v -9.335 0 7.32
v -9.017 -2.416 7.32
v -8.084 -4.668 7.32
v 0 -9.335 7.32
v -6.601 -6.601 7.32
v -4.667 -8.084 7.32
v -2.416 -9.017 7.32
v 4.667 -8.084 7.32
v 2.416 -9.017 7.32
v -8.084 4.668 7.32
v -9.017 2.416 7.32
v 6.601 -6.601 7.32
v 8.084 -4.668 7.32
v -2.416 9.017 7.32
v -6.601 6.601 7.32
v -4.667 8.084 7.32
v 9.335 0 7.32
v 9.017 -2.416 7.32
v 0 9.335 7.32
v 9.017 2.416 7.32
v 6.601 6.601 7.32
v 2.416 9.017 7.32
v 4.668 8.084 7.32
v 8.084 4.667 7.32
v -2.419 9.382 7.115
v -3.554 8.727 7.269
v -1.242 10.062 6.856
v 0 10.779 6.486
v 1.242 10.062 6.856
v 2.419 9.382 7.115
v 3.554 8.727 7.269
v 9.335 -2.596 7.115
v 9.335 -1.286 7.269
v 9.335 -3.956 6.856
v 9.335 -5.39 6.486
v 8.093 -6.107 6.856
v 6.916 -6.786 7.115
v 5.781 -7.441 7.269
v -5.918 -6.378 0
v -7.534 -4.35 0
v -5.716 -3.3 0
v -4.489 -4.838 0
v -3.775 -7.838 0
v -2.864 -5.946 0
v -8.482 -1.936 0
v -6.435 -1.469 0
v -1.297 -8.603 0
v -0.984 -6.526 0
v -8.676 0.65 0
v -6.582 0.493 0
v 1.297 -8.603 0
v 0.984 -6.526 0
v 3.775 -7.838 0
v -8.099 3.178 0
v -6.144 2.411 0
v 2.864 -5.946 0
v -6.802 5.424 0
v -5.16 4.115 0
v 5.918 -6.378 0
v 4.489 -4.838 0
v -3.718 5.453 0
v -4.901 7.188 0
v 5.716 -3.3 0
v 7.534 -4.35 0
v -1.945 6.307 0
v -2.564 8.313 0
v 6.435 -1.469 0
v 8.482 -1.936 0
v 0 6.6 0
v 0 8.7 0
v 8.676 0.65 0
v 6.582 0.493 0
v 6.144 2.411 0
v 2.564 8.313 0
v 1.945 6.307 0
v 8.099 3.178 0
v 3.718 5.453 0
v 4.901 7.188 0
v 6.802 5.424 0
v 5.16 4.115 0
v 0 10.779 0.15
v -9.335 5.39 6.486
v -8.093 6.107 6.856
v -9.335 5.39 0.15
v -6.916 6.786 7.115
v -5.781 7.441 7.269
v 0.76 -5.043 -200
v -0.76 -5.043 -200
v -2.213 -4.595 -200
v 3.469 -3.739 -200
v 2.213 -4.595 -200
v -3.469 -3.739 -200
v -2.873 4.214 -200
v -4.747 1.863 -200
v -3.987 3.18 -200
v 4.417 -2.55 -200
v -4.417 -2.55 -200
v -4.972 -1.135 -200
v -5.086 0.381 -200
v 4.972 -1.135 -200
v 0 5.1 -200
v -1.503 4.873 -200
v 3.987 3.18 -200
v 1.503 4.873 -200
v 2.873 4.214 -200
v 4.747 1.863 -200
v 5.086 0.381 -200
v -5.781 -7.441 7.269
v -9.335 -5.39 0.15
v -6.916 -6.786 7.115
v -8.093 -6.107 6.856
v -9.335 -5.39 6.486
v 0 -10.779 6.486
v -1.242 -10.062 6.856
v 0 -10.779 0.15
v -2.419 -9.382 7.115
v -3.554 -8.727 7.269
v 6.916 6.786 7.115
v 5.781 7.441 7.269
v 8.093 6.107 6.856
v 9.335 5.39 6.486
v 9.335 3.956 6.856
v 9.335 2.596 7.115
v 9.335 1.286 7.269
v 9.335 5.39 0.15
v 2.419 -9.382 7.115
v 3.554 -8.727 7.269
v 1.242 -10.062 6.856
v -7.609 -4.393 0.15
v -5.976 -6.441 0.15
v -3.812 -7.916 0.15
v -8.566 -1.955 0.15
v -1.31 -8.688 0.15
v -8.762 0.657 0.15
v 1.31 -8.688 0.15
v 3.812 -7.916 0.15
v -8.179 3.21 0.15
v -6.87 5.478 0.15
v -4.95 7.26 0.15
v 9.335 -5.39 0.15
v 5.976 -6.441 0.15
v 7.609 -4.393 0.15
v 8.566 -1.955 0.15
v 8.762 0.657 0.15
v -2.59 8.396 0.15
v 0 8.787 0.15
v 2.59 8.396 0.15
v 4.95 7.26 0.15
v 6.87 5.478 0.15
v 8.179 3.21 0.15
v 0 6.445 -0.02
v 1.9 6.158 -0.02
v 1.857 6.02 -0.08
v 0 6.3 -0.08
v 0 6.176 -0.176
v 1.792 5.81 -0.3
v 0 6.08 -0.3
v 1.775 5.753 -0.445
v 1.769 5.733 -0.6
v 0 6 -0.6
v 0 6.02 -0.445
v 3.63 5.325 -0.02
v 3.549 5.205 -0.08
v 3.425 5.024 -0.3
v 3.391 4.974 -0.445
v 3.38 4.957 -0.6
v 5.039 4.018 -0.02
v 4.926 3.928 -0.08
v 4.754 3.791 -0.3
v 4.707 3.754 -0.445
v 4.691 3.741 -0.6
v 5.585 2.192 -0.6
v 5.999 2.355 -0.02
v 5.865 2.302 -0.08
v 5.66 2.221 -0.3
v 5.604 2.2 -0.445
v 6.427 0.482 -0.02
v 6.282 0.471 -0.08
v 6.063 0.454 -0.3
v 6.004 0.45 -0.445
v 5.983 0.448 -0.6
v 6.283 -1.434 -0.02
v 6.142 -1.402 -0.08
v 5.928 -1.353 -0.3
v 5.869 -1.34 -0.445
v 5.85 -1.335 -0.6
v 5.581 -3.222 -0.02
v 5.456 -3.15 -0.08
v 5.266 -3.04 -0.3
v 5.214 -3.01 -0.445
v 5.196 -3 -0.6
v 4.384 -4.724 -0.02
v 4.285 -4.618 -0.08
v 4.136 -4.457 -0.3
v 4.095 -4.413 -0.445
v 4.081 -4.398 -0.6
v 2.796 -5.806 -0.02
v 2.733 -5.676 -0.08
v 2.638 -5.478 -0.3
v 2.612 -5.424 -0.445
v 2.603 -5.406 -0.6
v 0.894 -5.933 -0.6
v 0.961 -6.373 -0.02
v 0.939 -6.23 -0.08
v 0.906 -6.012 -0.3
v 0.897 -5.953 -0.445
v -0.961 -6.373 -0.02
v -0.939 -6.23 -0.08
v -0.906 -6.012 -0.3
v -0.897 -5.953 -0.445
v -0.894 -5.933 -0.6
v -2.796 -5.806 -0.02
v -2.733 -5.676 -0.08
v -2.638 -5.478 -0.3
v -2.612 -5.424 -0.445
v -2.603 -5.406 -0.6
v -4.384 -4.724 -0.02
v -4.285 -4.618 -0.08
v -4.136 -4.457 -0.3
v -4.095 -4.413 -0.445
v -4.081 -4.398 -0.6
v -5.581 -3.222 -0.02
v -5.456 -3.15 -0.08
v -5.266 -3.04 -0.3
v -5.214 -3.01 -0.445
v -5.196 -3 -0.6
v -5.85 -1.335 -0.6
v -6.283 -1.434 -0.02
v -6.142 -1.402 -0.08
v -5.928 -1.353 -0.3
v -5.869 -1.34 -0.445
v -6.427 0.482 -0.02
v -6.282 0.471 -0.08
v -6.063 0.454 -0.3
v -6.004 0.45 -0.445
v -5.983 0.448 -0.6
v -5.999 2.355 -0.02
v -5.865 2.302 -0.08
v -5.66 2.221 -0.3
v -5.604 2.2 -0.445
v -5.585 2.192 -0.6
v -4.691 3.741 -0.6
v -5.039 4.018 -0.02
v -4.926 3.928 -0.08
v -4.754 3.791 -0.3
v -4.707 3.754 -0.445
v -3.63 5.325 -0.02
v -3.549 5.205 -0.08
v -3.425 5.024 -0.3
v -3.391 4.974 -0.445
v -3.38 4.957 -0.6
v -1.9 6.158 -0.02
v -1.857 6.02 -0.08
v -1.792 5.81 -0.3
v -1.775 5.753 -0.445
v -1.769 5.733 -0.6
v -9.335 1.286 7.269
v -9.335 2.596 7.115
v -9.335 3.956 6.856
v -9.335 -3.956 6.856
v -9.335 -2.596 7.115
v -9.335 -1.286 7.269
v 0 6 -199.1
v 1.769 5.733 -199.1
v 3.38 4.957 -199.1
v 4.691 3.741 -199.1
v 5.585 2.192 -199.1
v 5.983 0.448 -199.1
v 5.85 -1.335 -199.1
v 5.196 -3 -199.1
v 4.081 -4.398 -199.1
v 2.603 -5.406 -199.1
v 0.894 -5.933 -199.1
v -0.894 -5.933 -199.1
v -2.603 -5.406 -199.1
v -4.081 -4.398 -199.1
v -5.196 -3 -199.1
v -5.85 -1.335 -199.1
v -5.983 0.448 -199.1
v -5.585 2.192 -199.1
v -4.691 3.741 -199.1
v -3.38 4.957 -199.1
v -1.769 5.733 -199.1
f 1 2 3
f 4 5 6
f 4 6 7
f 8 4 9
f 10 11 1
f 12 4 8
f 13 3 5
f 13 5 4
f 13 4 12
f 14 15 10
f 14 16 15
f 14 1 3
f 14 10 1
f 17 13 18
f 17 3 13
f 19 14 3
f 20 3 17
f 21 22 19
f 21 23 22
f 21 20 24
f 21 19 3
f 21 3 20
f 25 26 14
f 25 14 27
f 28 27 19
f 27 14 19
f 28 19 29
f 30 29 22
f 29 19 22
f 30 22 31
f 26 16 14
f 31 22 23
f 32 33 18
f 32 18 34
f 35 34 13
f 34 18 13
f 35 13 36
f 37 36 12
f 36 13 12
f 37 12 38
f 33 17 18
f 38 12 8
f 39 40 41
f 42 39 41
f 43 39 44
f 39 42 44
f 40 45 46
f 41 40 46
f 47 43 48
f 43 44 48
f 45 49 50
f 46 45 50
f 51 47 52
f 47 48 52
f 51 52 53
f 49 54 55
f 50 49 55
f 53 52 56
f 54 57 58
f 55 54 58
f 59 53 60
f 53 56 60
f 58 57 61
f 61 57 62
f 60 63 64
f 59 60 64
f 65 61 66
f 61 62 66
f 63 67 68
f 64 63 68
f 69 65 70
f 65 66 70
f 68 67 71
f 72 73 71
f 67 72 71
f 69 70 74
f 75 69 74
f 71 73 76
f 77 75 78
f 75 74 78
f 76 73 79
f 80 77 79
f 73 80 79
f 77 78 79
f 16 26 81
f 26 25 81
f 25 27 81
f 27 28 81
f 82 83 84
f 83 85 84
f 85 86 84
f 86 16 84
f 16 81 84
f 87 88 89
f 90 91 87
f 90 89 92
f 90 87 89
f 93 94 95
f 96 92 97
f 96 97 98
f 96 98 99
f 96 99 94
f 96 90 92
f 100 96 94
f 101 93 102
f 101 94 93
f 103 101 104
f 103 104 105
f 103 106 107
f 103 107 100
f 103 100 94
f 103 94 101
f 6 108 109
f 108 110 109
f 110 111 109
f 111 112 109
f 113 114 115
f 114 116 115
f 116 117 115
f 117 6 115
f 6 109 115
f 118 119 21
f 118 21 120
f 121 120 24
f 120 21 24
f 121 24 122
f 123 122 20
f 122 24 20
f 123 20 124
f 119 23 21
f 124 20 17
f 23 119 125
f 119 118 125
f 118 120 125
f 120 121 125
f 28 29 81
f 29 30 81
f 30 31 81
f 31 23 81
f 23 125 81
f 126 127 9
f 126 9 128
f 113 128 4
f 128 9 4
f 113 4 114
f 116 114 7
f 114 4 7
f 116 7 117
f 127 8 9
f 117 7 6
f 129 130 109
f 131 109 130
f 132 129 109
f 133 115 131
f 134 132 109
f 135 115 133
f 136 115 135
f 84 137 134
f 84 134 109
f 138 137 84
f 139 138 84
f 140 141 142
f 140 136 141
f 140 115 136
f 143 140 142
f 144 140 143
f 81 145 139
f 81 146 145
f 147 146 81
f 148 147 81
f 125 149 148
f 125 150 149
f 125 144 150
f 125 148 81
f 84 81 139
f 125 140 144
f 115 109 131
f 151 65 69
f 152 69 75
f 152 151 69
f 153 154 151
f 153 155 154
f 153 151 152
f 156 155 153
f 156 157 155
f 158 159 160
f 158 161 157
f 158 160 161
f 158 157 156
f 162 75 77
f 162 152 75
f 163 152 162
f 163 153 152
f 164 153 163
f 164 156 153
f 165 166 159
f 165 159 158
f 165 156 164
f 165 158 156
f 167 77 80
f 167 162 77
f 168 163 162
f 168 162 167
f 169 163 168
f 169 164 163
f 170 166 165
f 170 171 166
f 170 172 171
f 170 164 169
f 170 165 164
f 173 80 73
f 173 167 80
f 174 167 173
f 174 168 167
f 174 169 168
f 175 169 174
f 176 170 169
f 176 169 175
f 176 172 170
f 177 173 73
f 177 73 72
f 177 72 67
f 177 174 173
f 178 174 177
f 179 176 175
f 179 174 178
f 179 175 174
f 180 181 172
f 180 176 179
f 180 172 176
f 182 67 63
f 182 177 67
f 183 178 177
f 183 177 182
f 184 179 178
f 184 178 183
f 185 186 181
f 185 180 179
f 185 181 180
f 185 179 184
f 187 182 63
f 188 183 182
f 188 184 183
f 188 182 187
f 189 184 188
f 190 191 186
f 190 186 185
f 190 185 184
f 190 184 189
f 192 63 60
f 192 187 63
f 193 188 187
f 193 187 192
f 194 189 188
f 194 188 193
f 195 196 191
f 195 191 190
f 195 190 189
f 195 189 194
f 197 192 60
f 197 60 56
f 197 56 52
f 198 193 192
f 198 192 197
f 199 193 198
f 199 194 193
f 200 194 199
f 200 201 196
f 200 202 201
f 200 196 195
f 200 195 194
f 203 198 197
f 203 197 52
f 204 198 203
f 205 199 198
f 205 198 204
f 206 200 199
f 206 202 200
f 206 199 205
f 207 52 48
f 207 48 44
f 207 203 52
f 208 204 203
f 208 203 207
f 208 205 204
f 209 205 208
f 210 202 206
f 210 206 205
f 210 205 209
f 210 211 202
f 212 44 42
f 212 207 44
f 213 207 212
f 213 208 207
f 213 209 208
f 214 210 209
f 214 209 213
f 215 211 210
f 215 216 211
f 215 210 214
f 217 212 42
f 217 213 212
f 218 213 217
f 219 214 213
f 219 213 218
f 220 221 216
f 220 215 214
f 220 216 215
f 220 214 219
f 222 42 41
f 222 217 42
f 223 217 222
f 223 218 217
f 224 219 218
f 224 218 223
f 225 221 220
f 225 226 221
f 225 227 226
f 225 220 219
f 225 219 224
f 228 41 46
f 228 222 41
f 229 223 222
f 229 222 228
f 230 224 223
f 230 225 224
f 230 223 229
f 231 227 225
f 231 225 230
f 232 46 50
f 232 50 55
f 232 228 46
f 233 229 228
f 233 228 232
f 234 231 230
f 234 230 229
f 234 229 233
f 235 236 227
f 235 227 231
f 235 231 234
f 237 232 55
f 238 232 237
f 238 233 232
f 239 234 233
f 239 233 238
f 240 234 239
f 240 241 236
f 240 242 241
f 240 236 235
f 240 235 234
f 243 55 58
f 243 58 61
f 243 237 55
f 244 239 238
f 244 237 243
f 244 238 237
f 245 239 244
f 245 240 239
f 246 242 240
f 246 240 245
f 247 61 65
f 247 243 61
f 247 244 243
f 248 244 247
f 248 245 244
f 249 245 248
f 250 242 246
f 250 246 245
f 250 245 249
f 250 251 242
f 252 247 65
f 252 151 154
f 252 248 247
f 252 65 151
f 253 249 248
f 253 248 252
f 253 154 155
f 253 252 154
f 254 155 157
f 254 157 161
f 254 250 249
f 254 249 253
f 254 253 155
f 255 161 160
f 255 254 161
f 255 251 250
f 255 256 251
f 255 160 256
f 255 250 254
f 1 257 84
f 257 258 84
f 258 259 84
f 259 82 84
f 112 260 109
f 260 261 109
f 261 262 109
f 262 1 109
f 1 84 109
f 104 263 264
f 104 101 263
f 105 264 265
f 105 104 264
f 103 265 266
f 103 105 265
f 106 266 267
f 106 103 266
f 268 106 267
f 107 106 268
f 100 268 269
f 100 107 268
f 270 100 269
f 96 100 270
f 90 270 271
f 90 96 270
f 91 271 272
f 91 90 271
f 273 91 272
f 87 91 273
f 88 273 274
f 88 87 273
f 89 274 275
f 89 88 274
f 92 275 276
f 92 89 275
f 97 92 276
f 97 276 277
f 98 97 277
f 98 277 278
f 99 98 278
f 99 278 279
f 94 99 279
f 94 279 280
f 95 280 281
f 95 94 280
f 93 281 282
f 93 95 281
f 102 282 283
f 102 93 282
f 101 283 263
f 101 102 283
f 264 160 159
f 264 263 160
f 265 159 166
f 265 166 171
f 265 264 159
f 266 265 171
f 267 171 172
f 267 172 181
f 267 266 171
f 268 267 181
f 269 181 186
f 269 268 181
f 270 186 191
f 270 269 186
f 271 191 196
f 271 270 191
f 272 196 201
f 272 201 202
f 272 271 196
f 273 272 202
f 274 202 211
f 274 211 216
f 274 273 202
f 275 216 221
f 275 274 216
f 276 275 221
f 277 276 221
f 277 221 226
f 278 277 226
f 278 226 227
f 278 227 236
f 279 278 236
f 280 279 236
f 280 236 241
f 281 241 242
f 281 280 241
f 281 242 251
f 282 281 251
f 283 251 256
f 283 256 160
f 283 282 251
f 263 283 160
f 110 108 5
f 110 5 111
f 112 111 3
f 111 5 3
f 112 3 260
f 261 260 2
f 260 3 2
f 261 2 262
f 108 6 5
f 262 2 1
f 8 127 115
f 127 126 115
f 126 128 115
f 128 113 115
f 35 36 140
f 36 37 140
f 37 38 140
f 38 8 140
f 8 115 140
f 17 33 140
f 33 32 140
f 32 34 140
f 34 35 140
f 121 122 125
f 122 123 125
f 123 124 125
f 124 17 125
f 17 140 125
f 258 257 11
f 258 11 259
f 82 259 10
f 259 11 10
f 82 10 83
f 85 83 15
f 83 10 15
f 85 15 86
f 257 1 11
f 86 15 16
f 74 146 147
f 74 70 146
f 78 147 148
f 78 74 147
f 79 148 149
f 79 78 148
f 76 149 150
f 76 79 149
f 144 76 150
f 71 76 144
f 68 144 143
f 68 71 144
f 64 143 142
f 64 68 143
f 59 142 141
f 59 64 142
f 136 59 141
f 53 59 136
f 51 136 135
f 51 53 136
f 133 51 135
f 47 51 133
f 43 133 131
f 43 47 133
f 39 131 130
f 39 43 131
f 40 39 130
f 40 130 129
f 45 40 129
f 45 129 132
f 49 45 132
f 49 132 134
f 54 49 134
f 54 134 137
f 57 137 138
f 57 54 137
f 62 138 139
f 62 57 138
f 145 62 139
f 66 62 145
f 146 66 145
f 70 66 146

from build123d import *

# Parameters (mm, degrees)
BOSS_EXTRUDE1_DEPTH = 7.32


with BuildPart() as part:
    # Sketch1 → Boss-Extrude1 (new body)
    with BuildSketch(Plane.XY):
        Polygon((0, 10.779129526), (-9.335, 5.389564763), (-9.335, -5.389564763), (0, -10.779129526), (9.335, -5.389564763), (9.335, 5.389564763), align=None)
    extrude(amount=BOSS_EXTRUDE1_DEPTH)

    # Sketch2 → Revolve1 (revolve)
    with BuildSketch(Plane(origin=(0, 0, 0), x_dir=(0, 0, -1), z_dir=(1, 0, 0))):
        with BuildLine():
            Line((0, 0), (0, 6.6))
            ThreePointArc((0, 6.6), (0.175735931, 6.175735931), (0.6, 6))
            Line((0.6, 6), (199.1, 6))
            Line((199.1, 6), (200, 5.1))
            Line((200, 5.1), (200, 0))
            Line((200, 0), (0, 0))
        make_face()
    revolve(axis=Axis((0, 0, 0), (0, 0, -1)))

    # Sketch3 → Cut-Revolve1 (revolve, cut)
    with BuildSketch(Plane(origin=(0, 0, 0), x_dir=(0, 0, -1), z_dir=(1, 0, 0))):
        Polygon((-7.32, 10.779129526), (-6.48623143, 10.779129526), (-7.32, 9.335), align=None)
        Polygon((-0.15, 10.779129526), (-0.15, 8.78660254), (0, 8.7), (0, 10.779129526), align=None)
    revolve(axis=Axis((0, 0, 12.204941078), (0, 0, -1)), mode=Mode.SUBTRACT)


solid = part.part
